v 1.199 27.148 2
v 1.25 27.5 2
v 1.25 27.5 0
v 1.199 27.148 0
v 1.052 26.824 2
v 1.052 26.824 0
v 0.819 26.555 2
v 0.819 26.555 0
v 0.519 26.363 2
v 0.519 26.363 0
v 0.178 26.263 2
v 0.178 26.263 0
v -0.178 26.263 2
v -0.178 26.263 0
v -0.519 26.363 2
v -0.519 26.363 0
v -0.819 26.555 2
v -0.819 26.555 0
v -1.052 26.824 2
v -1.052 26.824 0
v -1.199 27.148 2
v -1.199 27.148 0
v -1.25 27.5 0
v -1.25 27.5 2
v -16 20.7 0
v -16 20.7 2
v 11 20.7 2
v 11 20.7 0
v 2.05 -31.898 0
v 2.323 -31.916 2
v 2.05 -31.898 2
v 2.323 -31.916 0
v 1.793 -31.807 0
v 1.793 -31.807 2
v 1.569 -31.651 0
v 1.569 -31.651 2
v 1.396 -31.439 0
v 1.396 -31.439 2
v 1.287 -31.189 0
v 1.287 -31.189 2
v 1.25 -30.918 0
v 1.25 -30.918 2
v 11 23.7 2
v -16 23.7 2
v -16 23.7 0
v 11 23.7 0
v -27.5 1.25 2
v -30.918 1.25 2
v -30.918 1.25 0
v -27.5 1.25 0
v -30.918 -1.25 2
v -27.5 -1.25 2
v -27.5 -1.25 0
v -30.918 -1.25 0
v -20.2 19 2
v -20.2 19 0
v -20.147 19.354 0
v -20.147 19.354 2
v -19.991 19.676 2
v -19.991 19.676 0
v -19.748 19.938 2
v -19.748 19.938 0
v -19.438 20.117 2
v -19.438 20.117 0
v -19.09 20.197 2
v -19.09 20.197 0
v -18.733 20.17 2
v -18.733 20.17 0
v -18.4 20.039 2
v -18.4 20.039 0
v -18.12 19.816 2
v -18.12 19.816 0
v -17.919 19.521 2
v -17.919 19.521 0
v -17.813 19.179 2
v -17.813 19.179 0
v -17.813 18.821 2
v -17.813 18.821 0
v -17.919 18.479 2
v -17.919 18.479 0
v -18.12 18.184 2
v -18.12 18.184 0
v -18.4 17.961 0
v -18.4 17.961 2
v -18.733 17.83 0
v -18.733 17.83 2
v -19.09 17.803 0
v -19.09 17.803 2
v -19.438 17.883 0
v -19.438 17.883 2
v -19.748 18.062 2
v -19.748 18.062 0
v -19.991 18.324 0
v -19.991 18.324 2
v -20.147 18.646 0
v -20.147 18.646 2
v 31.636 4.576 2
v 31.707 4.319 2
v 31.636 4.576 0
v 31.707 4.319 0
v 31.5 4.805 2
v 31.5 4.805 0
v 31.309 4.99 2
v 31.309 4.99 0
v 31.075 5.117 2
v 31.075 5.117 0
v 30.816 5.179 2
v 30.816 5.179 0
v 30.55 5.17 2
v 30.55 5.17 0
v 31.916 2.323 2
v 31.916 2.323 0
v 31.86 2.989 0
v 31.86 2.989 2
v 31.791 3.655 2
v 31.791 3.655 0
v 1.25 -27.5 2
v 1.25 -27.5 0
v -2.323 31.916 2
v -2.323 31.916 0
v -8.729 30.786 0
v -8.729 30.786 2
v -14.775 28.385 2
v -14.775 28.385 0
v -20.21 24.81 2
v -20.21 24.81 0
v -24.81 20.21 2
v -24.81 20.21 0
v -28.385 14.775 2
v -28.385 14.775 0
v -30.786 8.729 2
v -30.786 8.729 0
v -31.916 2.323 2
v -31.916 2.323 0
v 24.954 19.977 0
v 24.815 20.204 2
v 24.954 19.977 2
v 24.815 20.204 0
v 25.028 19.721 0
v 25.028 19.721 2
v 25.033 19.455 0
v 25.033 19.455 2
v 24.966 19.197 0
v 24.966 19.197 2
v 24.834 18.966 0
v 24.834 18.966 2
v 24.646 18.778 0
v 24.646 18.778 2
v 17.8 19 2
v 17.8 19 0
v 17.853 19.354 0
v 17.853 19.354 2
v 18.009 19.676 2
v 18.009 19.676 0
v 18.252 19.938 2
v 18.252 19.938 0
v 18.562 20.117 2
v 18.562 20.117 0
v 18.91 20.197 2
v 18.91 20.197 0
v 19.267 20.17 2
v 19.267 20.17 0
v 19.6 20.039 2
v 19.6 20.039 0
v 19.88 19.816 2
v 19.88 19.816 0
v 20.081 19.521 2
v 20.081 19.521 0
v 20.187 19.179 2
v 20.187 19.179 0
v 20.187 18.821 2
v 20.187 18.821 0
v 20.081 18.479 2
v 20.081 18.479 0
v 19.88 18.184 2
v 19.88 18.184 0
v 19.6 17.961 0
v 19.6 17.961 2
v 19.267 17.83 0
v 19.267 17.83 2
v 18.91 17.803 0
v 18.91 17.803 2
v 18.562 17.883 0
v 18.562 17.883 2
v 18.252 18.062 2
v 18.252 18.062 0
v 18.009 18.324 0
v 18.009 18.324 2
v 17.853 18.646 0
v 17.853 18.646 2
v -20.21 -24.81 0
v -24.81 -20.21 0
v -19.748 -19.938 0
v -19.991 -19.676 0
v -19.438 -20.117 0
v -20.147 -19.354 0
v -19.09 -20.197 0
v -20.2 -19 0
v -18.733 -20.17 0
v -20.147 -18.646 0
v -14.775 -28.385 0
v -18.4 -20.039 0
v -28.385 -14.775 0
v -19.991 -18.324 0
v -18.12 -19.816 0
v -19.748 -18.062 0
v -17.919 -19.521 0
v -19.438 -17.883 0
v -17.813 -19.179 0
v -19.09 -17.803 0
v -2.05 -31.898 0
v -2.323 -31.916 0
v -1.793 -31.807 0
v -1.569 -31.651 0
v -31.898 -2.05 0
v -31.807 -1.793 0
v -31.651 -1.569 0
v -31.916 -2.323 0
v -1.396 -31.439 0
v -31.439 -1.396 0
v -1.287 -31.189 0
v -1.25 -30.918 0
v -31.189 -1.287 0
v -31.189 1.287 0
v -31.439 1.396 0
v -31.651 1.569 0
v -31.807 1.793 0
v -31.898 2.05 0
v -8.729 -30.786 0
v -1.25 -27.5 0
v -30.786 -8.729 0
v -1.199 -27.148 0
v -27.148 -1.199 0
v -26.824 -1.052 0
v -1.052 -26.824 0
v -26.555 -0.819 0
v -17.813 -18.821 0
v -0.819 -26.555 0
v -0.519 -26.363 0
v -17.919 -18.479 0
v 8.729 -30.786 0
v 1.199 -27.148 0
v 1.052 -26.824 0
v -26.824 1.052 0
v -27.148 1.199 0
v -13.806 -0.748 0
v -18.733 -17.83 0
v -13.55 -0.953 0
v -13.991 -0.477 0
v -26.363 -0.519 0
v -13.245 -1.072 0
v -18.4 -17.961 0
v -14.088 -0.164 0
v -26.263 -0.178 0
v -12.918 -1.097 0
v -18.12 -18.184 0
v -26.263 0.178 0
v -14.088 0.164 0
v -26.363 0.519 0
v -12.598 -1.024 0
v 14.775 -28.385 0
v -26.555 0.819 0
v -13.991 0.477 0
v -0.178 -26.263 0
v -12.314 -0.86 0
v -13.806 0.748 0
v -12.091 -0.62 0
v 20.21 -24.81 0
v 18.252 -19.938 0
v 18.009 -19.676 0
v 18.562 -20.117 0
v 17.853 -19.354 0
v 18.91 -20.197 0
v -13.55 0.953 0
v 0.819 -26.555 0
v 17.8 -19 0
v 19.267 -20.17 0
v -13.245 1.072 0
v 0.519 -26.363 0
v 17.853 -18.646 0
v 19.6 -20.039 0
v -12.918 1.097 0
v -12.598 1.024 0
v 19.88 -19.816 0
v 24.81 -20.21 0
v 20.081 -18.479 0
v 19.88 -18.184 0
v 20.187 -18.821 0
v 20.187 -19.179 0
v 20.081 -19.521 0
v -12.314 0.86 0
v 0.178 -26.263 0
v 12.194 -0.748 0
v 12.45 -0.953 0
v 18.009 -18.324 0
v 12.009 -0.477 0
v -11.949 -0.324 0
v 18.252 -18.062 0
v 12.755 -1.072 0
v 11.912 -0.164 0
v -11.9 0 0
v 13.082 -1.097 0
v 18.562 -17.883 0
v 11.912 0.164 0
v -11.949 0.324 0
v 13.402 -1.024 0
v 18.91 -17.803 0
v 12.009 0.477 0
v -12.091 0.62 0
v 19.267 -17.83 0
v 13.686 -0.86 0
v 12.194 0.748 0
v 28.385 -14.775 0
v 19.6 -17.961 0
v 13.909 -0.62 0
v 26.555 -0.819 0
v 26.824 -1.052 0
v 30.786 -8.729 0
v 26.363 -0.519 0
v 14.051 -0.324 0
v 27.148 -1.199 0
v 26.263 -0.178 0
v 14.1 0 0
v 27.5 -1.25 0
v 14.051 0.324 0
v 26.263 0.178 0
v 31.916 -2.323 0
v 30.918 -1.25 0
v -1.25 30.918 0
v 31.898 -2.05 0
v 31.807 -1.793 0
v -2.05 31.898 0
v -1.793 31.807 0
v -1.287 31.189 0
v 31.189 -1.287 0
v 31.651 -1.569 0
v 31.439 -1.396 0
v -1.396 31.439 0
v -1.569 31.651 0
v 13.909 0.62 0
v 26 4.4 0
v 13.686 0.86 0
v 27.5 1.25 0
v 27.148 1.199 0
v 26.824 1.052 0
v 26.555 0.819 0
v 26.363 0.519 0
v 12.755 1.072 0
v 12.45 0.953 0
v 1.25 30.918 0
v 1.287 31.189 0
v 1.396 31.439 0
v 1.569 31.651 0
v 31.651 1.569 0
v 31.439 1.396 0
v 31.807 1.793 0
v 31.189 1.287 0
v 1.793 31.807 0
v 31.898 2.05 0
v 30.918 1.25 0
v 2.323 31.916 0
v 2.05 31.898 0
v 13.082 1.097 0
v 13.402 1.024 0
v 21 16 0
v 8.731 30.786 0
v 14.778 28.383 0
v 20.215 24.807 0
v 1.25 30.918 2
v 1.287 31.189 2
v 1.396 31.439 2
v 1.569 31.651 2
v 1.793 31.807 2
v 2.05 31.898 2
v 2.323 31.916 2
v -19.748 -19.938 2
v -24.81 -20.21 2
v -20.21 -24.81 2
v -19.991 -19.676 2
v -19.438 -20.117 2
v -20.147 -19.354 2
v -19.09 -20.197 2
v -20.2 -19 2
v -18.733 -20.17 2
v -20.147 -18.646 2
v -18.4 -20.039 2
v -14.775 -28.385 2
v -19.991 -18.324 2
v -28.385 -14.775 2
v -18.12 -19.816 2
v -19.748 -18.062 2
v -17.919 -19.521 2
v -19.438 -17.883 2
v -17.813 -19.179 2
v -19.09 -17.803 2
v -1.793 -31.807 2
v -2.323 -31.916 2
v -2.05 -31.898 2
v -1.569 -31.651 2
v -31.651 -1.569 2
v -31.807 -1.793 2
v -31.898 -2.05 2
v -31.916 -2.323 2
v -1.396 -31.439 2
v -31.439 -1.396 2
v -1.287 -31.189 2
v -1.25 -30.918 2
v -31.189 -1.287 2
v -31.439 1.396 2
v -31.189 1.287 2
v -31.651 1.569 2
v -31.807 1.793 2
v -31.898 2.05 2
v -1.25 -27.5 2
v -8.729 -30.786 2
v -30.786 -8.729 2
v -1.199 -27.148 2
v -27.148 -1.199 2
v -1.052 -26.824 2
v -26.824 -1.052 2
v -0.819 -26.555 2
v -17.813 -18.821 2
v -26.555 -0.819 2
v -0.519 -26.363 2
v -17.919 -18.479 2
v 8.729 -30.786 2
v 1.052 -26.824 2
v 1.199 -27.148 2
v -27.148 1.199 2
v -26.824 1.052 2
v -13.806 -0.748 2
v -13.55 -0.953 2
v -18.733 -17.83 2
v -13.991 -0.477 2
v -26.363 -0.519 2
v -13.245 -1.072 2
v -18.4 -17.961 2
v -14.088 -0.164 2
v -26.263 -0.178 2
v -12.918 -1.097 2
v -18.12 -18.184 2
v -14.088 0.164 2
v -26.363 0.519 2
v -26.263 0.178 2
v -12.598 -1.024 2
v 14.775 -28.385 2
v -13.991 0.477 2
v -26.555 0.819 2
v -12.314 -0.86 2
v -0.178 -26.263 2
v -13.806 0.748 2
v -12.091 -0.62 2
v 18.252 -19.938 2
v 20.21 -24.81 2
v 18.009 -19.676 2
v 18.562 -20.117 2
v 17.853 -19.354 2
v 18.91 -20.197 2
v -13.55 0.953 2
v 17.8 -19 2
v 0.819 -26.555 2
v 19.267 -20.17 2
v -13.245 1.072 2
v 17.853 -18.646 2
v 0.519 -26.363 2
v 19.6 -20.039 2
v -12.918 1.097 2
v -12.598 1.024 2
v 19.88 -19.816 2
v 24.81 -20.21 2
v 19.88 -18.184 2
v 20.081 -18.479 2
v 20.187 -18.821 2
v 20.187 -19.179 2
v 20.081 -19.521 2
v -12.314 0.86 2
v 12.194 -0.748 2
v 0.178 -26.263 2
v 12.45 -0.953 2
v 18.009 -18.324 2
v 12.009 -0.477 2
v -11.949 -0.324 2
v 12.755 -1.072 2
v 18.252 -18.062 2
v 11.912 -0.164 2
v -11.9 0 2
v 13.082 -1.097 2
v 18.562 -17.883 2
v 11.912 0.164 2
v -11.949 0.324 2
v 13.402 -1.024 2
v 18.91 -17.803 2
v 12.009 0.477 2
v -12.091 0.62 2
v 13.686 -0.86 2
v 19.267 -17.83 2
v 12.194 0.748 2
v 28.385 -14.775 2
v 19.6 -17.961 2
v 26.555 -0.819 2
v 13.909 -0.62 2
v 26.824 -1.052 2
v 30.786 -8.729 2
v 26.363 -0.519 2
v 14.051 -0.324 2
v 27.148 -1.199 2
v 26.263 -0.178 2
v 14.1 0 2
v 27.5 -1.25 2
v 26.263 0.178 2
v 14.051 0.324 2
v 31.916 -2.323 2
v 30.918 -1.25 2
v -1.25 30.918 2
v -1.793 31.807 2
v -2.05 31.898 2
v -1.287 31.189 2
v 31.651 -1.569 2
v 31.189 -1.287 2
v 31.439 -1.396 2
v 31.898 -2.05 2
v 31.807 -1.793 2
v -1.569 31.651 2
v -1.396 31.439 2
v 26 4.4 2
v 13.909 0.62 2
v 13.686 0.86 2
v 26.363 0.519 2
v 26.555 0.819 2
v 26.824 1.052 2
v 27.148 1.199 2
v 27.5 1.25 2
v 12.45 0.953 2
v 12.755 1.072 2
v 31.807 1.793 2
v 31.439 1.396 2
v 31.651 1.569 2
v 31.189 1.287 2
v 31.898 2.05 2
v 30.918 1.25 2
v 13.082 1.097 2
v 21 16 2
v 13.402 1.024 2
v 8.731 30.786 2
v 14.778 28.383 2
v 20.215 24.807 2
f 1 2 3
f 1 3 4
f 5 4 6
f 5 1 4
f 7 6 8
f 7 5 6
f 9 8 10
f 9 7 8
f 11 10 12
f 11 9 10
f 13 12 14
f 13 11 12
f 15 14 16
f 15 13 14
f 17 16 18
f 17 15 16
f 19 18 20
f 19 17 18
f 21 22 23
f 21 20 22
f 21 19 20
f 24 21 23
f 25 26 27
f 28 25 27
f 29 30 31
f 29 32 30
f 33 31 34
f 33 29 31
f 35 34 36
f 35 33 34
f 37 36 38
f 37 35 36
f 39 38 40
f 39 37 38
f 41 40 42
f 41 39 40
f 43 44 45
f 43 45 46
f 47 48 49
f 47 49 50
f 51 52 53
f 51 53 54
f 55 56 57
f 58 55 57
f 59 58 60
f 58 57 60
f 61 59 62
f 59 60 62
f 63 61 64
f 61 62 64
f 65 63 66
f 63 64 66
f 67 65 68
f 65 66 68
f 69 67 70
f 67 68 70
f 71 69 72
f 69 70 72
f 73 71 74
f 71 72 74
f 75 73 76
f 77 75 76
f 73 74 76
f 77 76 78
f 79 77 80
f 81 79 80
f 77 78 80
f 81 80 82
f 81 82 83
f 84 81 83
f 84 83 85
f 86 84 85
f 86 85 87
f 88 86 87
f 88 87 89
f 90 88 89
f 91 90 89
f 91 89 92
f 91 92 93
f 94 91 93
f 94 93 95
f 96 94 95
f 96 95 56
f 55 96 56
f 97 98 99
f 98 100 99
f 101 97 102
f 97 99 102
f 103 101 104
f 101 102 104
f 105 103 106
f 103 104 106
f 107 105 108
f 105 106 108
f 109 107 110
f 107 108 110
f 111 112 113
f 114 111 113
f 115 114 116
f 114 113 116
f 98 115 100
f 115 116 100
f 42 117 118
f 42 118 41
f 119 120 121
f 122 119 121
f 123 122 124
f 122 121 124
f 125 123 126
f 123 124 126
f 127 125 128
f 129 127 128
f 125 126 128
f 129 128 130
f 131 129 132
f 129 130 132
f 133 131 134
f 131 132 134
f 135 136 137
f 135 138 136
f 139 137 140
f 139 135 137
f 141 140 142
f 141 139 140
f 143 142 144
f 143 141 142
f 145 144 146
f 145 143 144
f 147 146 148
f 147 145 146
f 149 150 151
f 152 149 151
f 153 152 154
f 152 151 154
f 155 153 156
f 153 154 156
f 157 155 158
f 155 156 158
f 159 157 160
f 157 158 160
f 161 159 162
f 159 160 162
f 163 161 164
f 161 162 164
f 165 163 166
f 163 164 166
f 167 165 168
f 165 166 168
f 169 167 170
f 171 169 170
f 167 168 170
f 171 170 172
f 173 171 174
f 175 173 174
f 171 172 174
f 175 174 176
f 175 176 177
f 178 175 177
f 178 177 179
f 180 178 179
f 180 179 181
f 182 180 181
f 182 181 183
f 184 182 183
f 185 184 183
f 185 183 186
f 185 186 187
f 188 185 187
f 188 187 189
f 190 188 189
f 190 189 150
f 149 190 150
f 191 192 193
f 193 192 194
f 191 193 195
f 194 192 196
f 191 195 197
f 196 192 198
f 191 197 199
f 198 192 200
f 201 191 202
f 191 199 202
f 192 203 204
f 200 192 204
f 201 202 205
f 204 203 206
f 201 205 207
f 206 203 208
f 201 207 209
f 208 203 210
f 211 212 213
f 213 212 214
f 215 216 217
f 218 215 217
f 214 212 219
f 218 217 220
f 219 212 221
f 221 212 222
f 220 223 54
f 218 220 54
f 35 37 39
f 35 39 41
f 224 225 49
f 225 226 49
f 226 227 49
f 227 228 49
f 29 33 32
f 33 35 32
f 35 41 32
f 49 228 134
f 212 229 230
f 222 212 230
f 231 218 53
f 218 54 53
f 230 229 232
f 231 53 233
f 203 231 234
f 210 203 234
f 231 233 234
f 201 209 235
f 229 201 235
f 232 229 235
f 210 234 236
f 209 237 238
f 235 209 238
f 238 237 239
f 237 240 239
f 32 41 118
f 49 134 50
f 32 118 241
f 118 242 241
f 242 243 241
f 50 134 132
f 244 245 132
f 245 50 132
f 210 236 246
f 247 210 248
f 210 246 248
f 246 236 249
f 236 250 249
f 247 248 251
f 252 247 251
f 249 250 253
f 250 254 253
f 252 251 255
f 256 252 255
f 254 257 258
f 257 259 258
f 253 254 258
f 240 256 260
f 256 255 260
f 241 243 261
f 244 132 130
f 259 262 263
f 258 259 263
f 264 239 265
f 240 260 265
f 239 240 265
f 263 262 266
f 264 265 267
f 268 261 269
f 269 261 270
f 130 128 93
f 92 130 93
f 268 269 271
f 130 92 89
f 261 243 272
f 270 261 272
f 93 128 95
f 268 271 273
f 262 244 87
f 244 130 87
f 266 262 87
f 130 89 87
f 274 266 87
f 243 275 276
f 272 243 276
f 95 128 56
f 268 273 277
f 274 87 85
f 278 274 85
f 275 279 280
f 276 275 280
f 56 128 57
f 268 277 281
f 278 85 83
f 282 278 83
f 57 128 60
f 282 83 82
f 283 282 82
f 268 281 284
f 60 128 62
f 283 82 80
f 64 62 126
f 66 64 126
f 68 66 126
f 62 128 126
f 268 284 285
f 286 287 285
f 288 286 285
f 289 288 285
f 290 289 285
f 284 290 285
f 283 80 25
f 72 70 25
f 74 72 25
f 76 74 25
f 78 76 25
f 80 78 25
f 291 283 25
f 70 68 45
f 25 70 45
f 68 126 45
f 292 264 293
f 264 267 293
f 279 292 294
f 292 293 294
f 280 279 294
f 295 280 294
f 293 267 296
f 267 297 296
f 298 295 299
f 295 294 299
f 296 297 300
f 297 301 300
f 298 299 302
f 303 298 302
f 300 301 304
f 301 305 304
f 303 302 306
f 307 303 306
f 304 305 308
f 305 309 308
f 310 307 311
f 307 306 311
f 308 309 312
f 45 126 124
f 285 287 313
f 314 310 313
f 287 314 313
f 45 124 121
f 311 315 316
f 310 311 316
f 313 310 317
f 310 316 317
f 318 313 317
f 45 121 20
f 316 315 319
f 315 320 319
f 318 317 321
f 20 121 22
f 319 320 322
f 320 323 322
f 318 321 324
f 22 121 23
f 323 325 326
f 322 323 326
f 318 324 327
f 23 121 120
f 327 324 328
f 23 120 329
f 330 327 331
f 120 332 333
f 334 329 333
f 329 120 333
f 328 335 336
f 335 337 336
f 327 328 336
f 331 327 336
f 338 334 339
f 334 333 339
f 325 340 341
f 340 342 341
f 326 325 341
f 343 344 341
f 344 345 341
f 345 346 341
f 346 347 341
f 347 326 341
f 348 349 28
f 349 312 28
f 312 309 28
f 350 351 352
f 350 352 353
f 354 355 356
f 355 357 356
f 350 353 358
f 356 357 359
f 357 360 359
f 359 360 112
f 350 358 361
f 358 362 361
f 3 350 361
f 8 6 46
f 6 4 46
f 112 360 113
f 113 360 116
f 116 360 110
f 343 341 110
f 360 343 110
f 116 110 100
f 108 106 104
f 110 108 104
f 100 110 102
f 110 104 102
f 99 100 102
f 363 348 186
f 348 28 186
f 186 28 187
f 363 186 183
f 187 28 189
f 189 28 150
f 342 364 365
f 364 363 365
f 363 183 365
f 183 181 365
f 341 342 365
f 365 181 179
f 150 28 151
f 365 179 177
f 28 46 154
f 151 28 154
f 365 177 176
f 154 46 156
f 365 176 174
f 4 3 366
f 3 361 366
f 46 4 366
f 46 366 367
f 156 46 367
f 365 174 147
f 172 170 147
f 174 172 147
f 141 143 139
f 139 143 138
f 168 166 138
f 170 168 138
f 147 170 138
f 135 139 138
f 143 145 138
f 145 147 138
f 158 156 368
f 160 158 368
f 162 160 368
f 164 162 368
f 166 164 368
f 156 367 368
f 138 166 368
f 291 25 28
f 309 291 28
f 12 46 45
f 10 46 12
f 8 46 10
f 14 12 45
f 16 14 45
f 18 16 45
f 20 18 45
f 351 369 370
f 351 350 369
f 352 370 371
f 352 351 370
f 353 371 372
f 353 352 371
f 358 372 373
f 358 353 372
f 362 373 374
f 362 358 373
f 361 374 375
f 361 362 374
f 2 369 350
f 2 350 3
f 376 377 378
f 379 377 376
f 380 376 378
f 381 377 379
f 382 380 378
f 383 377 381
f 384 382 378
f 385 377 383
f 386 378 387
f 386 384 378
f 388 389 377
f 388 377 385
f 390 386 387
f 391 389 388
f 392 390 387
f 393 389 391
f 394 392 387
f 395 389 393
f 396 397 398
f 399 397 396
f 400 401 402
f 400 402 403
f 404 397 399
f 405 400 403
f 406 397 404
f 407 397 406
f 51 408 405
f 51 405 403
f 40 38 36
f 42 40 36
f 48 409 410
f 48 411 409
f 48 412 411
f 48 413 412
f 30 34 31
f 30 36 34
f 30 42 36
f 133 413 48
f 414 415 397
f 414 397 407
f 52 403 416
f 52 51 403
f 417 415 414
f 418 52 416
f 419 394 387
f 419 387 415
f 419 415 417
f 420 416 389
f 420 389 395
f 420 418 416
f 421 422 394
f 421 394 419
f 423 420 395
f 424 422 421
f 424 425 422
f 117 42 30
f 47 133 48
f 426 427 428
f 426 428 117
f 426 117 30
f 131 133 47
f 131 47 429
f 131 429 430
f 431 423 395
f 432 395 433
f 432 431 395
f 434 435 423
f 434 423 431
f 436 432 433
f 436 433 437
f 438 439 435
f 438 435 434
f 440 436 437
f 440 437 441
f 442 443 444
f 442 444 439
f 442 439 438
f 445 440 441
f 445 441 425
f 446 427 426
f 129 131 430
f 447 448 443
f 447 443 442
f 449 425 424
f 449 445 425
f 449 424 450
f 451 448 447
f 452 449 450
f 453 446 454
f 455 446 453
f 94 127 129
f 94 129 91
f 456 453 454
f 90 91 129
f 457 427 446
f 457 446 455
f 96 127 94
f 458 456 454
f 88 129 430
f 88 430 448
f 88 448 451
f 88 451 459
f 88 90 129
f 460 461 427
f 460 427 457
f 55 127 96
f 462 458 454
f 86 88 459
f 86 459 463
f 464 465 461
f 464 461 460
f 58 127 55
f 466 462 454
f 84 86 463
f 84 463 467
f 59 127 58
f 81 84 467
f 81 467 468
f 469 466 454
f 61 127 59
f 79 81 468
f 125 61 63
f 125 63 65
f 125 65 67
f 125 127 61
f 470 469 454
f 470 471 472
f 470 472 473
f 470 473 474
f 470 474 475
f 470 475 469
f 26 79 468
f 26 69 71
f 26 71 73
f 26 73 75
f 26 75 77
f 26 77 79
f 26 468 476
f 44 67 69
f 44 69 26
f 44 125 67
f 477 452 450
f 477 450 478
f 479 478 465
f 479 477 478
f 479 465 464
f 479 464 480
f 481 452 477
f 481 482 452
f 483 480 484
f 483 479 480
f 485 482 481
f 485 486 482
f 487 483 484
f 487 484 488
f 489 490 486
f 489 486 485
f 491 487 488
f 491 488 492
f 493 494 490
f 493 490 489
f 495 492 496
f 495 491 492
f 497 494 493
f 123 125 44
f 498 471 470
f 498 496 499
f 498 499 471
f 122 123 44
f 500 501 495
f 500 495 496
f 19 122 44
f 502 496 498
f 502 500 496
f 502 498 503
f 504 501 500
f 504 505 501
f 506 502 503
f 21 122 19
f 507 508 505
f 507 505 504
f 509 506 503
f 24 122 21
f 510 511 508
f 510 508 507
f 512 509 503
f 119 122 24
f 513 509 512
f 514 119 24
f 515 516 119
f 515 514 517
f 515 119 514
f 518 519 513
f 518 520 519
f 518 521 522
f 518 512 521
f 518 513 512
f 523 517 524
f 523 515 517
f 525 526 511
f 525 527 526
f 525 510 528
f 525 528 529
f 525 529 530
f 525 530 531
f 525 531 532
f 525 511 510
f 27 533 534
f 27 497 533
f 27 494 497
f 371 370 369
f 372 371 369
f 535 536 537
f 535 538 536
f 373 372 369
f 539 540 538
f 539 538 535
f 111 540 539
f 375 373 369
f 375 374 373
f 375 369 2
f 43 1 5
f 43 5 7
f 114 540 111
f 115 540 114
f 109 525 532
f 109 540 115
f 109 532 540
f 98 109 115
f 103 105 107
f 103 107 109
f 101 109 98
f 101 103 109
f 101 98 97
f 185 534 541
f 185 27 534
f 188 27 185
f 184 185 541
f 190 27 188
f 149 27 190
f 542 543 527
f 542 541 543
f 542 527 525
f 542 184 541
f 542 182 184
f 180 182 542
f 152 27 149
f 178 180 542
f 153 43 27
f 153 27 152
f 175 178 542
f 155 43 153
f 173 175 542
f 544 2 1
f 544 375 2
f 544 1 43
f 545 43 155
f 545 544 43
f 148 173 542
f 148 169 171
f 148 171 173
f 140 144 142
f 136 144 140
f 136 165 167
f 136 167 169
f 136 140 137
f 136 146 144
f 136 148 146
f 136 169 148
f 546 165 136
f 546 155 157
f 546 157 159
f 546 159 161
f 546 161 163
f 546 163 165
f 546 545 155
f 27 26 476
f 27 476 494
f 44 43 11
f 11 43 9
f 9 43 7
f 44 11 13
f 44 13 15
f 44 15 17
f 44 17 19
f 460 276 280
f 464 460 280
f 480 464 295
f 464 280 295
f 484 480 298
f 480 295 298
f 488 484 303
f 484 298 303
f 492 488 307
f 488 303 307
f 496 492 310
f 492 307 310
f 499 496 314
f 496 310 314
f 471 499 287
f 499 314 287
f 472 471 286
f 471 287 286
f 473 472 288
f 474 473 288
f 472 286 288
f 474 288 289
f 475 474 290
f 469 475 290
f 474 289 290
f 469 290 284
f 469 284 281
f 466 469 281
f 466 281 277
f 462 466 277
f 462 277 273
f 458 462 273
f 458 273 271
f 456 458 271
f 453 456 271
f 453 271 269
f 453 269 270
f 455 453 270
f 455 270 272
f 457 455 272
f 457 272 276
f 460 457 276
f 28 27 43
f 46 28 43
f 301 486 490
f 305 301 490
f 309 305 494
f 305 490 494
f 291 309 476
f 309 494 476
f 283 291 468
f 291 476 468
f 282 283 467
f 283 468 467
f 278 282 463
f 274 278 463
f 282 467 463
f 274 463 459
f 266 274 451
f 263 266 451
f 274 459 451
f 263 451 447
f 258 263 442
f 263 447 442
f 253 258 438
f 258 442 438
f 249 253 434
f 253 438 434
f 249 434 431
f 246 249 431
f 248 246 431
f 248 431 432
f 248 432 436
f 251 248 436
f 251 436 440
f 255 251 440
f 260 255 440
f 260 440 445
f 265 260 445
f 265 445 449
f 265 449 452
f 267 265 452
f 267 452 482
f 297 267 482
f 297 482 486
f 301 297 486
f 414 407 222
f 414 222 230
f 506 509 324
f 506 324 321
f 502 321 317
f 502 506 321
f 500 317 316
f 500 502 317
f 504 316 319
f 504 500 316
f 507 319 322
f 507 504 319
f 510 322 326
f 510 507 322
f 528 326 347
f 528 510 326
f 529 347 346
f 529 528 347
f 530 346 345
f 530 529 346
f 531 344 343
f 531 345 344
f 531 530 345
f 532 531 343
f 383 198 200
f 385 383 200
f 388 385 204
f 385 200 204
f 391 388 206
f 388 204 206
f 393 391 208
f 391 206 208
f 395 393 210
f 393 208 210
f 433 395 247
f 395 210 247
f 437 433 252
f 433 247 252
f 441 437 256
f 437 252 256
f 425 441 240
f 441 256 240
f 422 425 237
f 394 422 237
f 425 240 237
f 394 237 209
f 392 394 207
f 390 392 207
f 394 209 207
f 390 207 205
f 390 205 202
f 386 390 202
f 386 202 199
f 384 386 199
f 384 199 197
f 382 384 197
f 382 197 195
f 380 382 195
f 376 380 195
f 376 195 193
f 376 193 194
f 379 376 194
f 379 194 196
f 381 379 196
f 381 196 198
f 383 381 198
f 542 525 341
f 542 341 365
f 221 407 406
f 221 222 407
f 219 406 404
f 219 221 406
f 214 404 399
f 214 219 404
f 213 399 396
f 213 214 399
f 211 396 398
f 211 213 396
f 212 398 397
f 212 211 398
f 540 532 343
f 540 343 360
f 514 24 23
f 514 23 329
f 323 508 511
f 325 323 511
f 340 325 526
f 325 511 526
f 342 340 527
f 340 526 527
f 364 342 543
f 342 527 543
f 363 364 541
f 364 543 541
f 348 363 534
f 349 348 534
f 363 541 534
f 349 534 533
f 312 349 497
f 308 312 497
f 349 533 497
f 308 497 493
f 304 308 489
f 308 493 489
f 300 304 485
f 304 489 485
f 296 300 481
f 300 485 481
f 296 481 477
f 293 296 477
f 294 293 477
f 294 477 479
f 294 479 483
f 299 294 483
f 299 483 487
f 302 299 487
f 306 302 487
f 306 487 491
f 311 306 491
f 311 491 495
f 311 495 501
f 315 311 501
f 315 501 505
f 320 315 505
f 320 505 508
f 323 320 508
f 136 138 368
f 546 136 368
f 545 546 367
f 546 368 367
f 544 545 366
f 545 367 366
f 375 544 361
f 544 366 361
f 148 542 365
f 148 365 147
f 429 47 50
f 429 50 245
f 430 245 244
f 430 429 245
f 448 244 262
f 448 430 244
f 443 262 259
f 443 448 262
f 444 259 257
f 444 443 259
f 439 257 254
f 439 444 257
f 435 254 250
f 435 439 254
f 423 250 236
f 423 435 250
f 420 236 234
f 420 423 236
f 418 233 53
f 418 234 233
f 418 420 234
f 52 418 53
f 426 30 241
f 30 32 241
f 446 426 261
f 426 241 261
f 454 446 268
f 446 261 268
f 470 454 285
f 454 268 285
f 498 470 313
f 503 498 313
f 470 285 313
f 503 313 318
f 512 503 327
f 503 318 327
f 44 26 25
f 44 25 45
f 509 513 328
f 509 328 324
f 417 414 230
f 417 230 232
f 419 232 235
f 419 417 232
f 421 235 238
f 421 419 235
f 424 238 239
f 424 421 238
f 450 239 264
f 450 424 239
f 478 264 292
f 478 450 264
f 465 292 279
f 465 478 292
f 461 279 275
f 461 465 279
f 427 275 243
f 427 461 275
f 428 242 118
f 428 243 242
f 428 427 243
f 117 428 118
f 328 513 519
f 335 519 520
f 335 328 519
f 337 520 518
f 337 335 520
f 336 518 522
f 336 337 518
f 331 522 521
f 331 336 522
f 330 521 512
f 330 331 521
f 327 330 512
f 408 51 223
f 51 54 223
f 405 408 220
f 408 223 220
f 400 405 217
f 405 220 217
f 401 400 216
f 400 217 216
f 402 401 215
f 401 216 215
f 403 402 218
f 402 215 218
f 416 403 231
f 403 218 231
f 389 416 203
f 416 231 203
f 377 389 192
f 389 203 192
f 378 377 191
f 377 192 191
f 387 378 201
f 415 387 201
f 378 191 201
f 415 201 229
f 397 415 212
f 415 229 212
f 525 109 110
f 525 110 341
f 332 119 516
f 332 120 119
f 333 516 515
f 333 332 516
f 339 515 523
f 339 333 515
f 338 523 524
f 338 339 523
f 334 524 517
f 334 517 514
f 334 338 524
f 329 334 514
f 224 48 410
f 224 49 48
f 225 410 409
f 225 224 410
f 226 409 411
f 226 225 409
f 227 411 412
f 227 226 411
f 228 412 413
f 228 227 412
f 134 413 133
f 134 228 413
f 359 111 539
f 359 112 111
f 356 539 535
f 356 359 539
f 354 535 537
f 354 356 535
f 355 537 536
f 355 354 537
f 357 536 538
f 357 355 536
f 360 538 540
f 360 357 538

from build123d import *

# Parameters (mm, degrees)
SKETCH_1_R             = 32
EXTRUDE_1_DEPTH        = 2
SKETCH_2_R             = 1.1
CUT_EXTRUDE_1_DEPTH    = 46.299006612
HOLE_WIZARD_M2_1_D     = 2.4
HOLE_WIZARD_M2_1_DEPTH = 3.5
HOLE_WIZARD_M2_1_TIP   = 0.721032743
SKETCH_6_R             = 1.1
SKETCH_6_W             = 27
SKETCH_6_H             = 3
CUT_EXTRUDE_2_DEPTH    = 46.264500439
CUT_EXTRUDE1_DEPTH     = 10
FILLET2_R              = 1


with BuildPart() as part:
    # 스케치1 → 보스-돌출1 (new body)
    with BuildSketch(Plane.XY):
        Circle(SKETCH_1_R)
    extrude(amount=EXTRUDE_1_DEPTH)

    # 스케치2 → 컷-돌출1 (cut, through all)
    with BuildSketch(Plane.XY.offset(2)):
        with Locations((-13, 0)):
            Circle(SKETCH_2_R)
        with Locations((13, 0)):
            Circle(SKETCH_2_R)
        with BuildLine():
            Line((1.25, -27.5), (1.25, -31.975576617))
            ThreePointArc((1.25, -31.975576617), (0, -33.225576617), (-1.25, -31.975576617))
            Line((-1.25, -31.975576617), (-1.25, -27.5))
            ThreePointArc((-1.25, -27.5), (0, -26.25), (1.25, -27.5))
        make_face()
        with BuildLine():
            Line((27.5, 1.25), (32, 1.25))
            ThreePointArc((32, 1.25), (33.25, 0), (32, -1.25))
            Line((32, -1.25), (27.5, -1.25))
            ThreePointArc((27.5, -1.25), (26.25, 0), (27.5, 1.25))
        make_face()
        with BuildLine():
            Line((-27.5, -1.25), (-32, -1.25))
            ThreePointArc((-32, -1.25), (-33.25, 0), (-32, 1.25))
            Line((-32, 1.25), (-27.5, 1.25))
            ThreePointArc((-27.5, 1.25), (-26.25, 0), (-27.5, -1.25))
        make_face()
        with BuildLine():
            Line((-1.25, 27.5), (-1.25, 32))
            ThreePointArc((-1.25, 32), (0, 33.25), (1.25, 32))
            Line((1.25, 32), (1.25, 27.5))
            ThreePointArc((1.25, 27.5), (0, 26.25), (-1.25, 27.5))
        make_face()
    extrude(amount=-CUT_EXTRUDE_1_DEPTH, mode=Mode.SUBTRACT)

    # M2 여유 구멍1
    with Locations(Plane(origin=(-19, 19, 2), x_dir=(1, 0, 0), z_dir=(0, 0, 1))):
        with Locations((0, 0), (38, 0), (38, -38), (0, -38)):
            Hole(HOLE_WIZARD_M2_1_D / 2, depth=HOLE_WIZARD_M2_1_DEPTH)
            with Locations((0, 0, -(HOLE_WIZARD_M2_1_DEPTH + HOLE_WIZARD_M2_1_TIP / 2))):  # 118° drill point
                Cone(0, HOLE_WIZARD_M2_1_D / 2, HOLE_WIZARD_M2_1_TIP, mode=Mode.SUBTRACT)

    # 스케치6 → 컷-돌출2 (cut, through all)
    with BuildSketch(Plane.XY.offset(2)):
        with Locations((25, 22.2)):
            Circle(SKETCH_6_R)
        with Locations((-2.5, 22.2)):
            Rectangle(SKETCH_6_W, SKETCH_6_H)
    extrude(amount=-CUT_EXTRUDE_2_DEPTH, mode=Mode.SUBTRACT)

    # Sketch1 → Cut-Extrude1 (cut)
    with BuildSketch(Plane.XY.offset(2)):
        Polygon((21, 16), (30.255253107, 23.051621415), (39.765804764, 6.729597729), (26, 4.4), align=None)
    extrude(amount=-CUT_EXTRUDE1_DEPTH, mode=Mode.SUBTRACT)

    # Fillet2
    fillet2_edges = [part.edges().sort_by_distance(p)[0] for p in [
        (25.453815041, 19.393382888, 1),
        (31.551388335, 5.339465718, 1),
        (1.25, -31.975576617, 1),
        (-1.25, -31.975576617, 1),
        (31.975576617, 1.25, 1),
        (31.975576617, -1.25, 1),
        (-31.975576617, -1.25, 1),
        (-31.975576617, 1.25, 1),
        (-1.25, 31.975576617, 1),
        (1.25, 31.975576617, 1),
    ]]
    fillet(fillet2_edges, radius=FILLET2_R)


solid = part.part
